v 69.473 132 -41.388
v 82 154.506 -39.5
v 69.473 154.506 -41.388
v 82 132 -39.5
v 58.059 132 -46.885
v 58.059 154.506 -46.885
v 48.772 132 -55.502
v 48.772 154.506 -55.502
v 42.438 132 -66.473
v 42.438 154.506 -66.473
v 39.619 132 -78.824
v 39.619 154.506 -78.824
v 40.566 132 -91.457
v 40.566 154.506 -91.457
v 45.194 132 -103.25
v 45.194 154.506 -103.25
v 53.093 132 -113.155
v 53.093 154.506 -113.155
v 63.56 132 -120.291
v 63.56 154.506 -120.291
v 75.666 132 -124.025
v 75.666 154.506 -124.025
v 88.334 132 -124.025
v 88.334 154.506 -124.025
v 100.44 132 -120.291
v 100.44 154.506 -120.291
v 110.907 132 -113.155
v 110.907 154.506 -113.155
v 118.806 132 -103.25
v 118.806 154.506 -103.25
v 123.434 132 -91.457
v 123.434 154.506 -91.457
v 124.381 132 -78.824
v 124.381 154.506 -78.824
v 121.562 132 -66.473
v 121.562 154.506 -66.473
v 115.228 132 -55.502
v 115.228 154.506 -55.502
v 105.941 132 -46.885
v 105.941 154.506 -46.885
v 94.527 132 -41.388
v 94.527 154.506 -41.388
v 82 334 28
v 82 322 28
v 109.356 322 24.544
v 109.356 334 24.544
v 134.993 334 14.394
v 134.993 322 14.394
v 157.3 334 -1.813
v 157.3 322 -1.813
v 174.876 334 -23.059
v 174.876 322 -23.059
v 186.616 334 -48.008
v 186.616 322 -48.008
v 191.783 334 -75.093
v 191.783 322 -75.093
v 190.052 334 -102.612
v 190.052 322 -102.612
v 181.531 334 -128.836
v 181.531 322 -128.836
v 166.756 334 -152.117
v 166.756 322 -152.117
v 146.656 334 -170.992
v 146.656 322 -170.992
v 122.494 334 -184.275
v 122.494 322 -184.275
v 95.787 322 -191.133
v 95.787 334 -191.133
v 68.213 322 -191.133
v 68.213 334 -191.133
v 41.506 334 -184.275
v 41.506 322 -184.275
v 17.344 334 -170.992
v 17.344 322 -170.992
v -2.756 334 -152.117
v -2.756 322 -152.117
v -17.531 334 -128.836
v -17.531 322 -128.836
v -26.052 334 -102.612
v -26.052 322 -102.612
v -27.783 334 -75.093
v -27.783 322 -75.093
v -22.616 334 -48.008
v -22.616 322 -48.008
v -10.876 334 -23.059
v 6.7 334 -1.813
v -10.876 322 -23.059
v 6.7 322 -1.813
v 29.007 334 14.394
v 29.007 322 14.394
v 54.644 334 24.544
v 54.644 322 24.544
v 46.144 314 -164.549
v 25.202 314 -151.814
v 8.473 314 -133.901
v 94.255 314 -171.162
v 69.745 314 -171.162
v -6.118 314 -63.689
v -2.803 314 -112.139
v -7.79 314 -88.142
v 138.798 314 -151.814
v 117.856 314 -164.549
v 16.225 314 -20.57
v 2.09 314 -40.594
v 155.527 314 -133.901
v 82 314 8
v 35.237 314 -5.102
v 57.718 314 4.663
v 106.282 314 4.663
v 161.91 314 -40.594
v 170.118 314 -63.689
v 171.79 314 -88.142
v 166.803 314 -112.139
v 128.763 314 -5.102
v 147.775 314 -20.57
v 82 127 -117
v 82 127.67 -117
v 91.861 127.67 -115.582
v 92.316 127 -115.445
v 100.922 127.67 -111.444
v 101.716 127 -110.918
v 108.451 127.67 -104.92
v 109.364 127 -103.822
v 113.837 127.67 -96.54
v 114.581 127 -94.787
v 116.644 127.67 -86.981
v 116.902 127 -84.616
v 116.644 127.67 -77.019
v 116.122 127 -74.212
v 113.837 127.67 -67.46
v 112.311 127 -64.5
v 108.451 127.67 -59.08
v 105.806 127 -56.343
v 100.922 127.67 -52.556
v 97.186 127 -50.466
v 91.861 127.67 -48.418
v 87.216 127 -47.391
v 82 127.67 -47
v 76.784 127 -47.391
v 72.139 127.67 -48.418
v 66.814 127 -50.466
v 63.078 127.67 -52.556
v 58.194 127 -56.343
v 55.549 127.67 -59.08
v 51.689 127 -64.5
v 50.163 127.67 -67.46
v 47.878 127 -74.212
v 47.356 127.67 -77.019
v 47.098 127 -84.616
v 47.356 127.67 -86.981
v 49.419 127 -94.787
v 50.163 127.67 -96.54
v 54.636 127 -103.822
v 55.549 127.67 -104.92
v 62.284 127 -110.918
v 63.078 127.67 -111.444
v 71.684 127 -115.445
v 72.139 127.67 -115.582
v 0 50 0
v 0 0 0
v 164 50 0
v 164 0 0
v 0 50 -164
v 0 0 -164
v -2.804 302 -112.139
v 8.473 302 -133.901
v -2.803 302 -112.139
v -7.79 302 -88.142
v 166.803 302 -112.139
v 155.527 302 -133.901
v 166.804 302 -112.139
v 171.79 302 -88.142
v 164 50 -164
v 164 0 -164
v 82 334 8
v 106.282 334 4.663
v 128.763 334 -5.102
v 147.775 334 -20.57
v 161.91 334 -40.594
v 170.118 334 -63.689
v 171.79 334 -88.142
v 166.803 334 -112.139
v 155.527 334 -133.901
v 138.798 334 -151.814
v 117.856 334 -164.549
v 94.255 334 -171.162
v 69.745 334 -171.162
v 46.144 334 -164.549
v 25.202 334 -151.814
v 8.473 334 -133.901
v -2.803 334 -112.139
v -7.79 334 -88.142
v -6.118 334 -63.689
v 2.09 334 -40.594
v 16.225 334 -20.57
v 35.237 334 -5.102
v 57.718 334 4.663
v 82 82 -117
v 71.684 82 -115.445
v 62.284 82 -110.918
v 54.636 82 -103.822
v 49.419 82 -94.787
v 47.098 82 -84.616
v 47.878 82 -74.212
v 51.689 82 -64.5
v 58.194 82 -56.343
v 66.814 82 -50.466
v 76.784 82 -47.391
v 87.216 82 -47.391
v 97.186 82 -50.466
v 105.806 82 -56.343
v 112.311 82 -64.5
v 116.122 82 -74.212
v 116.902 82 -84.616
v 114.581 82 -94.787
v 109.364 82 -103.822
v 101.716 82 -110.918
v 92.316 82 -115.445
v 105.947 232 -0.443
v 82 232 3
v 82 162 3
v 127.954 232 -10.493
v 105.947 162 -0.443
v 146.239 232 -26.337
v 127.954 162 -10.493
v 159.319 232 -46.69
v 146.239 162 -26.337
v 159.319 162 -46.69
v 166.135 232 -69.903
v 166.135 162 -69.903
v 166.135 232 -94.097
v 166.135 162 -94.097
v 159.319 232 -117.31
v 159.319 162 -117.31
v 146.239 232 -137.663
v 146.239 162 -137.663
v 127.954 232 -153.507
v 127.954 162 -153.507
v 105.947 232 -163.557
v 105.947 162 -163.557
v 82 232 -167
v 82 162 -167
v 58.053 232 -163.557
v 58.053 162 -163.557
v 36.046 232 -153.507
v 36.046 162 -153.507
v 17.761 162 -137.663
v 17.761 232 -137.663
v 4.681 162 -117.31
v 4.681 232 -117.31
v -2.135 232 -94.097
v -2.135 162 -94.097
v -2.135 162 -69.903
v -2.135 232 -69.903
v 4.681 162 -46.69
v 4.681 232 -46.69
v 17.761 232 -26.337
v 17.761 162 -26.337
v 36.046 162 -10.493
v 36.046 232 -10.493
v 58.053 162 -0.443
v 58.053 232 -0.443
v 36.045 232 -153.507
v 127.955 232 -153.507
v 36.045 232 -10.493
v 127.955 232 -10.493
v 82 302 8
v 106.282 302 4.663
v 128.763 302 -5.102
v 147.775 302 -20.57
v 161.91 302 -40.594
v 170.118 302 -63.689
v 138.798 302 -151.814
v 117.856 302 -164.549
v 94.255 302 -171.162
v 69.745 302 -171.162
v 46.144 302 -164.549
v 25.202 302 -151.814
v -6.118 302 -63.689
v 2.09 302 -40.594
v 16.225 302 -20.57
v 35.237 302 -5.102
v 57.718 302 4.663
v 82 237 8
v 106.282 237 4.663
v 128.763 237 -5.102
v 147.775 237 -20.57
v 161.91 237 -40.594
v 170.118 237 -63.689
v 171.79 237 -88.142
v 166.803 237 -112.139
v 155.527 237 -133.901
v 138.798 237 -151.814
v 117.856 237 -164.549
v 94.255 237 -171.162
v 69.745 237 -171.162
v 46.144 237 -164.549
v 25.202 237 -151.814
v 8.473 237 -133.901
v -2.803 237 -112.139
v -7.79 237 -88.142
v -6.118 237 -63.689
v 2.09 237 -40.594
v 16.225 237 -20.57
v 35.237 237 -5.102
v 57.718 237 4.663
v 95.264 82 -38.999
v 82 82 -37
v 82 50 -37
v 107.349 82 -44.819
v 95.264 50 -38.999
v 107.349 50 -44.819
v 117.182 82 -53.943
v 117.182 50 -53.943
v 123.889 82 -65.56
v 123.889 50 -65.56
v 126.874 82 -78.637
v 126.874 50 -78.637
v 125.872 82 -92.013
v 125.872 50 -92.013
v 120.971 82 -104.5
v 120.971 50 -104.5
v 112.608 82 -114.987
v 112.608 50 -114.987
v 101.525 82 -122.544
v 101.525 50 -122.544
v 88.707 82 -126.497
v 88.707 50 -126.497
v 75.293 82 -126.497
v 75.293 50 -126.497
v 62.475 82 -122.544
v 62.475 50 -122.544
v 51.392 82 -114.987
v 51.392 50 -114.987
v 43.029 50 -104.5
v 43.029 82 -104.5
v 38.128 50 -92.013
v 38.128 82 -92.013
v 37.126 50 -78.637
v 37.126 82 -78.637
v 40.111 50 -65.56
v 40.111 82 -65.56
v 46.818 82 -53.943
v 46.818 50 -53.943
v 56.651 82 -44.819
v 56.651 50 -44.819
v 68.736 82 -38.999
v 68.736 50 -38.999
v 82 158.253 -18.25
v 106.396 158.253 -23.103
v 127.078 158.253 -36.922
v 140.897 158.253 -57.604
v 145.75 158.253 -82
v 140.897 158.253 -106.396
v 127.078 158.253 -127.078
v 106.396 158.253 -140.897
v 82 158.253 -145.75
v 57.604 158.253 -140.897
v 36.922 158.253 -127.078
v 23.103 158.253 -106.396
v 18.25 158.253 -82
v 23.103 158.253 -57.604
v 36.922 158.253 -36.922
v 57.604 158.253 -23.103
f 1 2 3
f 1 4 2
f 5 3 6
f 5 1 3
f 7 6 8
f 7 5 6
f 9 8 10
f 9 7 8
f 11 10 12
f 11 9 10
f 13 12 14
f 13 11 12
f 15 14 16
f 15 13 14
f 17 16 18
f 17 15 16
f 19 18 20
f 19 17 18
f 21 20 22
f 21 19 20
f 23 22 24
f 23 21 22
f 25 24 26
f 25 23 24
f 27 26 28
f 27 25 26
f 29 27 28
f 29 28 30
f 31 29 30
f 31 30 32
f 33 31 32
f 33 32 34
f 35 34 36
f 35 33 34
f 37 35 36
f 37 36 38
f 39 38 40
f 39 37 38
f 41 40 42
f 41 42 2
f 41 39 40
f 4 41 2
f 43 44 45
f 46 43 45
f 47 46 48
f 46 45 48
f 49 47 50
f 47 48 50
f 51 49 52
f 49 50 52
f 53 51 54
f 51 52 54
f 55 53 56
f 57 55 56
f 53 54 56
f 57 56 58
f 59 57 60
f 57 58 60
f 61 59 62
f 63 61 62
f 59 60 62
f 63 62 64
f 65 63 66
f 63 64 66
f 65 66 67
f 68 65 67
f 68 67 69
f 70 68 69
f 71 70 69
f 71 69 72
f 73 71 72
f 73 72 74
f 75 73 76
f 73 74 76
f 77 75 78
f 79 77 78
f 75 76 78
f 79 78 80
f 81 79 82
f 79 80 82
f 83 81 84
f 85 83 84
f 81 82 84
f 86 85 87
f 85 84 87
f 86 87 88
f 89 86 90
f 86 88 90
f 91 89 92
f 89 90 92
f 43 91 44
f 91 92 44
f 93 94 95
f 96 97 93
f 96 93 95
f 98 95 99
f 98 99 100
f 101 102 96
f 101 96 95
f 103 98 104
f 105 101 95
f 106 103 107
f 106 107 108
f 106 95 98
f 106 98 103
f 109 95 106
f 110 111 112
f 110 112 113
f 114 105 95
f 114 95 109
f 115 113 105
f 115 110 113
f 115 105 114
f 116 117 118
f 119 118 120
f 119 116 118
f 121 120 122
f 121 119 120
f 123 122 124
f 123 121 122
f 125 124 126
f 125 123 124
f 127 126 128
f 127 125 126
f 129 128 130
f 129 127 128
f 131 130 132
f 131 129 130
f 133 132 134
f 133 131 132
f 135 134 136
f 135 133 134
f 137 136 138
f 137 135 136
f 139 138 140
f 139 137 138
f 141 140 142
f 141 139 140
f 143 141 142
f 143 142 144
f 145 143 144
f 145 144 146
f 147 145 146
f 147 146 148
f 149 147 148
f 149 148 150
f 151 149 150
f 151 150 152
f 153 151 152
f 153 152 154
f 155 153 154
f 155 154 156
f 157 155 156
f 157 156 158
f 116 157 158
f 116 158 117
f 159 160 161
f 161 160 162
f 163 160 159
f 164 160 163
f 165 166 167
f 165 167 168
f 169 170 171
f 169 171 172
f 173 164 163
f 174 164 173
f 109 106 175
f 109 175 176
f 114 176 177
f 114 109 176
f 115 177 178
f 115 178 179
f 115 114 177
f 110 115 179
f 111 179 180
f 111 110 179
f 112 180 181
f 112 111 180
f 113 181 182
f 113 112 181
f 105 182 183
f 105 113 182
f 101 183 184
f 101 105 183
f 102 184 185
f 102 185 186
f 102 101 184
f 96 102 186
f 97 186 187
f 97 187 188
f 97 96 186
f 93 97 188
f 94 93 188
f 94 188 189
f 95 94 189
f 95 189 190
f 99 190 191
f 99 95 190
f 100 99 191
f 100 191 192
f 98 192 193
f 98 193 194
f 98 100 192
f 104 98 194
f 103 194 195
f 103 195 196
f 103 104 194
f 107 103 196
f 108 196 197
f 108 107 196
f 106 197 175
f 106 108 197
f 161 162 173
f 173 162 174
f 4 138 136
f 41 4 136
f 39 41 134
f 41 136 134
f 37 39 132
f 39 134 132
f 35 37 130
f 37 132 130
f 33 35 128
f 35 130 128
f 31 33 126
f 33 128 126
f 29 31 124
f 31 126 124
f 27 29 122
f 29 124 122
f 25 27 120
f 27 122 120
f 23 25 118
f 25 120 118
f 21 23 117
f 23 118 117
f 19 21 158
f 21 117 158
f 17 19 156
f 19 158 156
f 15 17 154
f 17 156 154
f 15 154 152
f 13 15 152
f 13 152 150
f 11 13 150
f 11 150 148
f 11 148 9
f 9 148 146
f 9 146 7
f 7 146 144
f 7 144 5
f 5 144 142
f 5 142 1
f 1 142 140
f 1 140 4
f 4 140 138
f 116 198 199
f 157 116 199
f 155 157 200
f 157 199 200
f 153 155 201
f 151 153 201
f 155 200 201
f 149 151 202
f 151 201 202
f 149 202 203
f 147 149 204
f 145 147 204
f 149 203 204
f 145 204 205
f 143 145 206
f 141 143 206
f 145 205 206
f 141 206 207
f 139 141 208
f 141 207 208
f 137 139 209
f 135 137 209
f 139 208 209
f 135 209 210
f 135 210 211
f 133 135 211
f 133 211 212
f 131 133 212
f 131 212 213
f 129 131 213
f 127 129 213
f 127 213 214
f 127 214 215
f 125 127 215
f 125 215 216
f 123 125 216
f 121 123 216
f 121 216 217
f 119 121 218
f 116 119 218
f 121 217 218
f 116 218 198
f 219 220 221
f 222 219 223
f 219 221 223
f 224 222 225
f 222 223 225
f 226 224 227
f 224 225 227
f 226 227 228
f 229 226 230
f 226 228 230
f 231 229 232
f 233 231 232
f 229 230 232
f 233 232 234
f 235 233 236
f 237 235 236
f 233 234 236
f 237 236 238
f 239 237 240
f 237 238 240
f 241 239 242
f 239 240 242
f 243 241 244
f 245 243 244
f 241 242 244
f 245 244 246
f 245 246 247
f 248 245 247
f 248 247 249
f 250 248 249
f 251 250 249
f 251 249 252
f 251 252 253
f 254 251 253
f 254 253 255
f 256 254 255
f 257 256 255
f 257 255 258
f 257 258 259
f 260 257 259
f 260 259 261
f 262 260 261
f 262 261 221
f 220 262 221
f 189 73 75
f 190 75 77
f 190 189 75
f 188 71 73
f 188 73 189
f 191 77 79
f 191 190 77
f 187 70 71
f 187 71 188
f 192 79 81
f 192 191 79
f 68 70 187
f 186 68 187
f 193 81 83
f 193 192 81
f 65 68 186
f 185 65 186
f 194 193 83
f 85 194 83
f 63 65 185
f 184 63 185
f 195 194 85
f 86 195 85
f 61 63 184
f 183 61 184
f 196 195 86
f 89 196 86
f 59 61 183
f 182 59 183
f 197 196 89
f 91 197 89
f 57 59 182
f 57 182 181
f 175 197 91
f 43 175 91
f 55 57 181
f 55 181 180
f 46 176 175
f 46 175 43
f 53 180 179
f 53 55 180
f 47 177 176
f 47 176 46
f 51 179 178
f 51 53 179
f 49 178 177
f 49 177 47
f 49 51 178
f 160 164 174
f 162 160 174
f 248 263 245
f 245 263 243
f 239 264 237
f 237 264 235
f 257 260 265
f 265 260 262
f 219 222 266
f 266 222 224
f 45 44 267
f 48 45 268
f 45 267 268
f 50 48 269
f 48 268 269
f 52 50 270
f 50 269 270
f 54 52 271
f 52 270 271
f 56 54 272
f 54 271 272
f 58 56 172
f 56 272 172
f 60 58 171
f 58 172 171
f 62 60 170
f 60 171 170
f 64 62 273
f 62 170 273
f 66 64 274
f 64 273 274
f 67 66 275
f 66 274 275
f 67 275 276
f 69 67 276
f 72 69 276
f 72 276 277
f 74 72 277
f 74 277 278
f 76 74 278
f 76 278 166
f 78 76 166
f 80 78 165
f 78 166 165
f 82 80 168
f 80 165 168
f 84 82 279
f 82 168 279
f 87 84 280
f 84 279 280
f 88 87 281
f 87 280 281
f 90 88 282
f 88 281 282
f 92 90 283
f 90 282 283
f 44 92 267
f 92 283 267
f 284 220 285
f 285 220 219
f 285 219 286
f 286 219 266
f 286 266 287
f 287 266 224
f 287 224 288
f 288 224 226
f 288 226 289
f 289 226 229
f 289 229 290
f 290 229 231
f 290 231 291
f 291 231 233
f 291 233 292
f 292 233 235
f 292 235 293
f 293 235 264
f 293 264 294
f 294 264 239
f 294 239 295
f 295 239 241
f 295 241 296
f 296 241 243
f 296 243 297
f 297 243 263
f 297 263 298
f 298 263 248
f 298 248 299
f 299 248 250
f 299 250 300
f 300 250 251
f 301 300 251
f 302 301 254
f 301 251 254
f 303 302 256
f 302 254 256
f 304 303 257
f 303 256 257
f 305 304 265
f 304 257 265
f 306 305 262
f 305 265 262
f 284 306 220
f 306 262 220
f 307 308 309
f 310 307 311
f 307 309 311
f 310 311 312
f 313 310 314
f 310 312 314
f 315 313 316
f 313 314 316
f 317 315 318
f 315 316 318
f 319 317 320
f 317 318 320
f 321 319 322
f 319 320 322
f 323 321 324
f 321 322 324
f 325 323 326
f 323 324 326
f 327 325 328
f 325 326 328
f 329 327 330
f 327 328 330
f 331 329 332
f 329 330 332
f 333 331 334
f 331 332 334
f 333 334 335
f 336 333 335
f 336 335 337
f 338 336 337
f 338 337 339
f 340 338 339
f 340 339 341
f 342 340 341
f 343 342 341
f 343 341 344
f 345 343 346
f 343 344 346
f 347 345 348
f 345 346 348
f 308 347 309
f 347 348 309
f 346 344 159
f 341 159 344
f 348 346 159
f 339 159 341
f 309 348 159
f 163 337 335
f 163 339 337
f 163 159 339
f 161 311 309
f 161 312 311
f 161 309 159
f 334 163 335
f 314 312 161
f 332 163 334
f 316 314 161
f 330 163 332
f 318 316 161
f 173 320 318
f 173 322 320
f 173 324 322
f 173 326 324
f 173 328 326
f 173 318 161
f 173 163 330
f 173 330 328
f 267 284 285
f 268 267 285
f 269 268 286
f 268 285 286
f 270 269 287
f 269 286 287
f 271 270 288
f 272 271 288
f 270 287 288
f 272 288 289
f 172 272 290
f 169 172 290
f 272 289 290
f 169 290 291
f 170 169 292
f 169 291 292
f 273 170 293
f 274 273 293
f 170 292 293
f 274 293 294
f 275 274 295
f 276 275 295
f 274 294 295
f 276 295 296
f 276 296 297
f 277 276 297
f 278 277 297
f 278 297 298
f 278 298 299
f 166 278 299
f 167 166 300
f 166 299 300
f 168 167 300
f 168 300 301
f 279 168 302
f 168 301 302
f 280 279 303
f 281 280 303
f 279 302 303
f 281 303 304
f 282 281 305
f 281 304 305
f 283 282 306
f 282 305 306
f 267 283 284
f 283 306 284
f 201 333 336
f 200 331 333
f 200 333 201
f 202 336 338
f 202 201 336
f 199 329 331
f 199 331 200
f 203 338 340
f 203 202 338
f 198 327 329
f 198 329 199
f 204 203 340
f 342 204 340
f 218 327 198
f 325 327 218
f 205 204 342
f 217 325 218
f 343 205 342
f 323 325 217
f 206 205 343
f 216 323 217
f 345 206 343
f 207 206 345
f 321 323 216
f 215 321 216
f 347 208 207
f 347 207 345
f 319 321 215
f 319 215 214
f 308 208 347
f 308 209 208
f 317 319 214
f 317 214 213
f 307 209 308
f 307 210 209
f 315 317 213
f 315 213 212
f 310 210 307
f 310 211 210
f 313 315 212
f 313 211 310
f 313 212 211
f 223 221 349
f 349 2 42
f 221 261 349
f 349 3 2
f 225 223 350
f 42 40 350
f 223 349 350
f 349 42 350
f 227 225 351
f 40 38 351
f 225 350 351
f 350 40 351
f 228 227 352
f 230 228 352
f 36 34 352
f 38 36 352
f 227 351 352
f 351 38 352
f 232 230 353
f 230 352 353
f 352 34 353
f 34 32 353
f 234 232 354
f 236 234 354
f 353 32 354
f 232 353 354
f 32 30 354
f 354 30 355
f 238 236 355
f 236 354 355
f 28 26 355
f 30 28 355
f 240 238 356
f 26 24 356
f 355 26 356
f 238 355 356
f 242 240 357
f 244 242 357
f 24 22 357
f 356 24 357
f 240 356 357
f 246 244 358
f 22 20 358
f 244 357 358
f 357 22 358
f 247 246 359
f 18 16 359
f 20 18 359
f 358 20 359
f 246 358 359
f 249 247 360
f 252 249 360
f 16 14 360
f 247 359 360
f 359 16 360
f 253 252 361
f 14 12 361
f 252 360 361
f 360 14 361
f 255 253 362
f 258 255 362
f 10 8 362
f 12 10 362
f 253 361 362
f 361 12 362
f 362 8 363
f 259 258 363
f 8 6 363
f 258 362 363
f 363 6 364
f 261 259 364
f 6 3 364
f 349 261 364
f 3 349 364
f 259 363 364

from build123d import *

# Parameters (mm, degrees)
SKETCH1_W           = 164
SKETCH1_H           = 164
BOSS_EXTRUDE1_DEPTH = 50
SKETCH2_R           = 45
BOSS_EXTRUDE2_DEPTH = 32
SKETCH3_R           = 35
BOSS_EXTRUDE3_DEPTH = 45
SKETCH4_R           = 42.5
BOSS_EXTRUDE4_DEPTH = 25
SKETCH5_R           = 85
BOSS_EXTRUDE5_DEPTH = 80
SKETCH6_R           = 90
BOSS_EXTRUDE6_DEPTH = 70
SKETCH7_R           = 110
BOSS_EXTRUDE7_DEPTH = 32
CHAMFER1_SIZE       = 20
CHAMFER2_SIZE       = 5
CHAMFER3_SIZE       = 10
CHAMFER3_SIZE_2     = 56.712818196
CHAMFER4_SIZE       = 5
CHAMFER4_SIZE_2     = 8.660254038
CUT_EXTRUDE1_START  = -20
SKETCH8_R           = 90
CUT_EXTRUDE1_DEPTH  = 20


# Some blends are built 0.0001 mm under size
with BuildPart() as part:
    # Sketch1 → Boss-Extrude1 (new body)
    with BuildSketch(Plane(origin=(0, 0, 0), x_dir=(1, 0, 0), z_dir=(0, 1, 0))):
        with Locations((82, 82)):
            Rectangle(SKETCH1_W, SKETCH1_H)
    extrude(amount=BOSS_EXTRUDE1_DEPTH)

    # Sketch2 → Boss-Extrude2 (add)
    with BuildSketch(Plane(origin=(0, 50, 0), x_dir=(1, 0, 0), z_dir=(0, 1, 0))):
        with Locations(Location((82, 82, 0), (0, 0, 270))):
            Circle(SKETCH2_R)
    extrude(amount=BOSS_EXTRUDE2_DEPTH)

    # Sketch3 → Boss-Extrude3 (add)
    with BuildSketch(Plane(origin=(0, 82, 0), x_dir=(1, 0, 0), z_dir=(0, 1, 0))):
        with Locations(Location((82, 82, 0), (0, 0, 90))):
            Circle(SKETCH3_R)
    extrude(amount=BOSS_EXTRUDE3_DEPTH)

    # Sketch4 → Boss-Extrude4 (add)
    with BuildSketch(Plane(origin=(0, 127, 0), x_dir=(1, 0, 0), z_dir=(0, 1, 0))):
        with Locations(Location((82, 82, 0), (0, 0, 270))):
            Circle(SKETCH4_R)
    extrude(amount=BOSS_EXTRUDE4_DEPTH)

    # Sketch5 → Boss-Extrude5 (add)
    with BuildSketch(Plane(origin=(0, 152, 0), x_dir=(1, 0, 0), z_dir=(0, 1, 0))):
        with Locations(Location((82, 82, 0), (0, 0, 270))):
            Circle(SKETCH5_R)
    extrude(amount=BOSS_EXTRUDE5_DEPTH)

    # Sketch6 → Boss-Extrude6 (add)
    with BuildSketch(Plane(origin=(0, 232, 0), x_dir=(1, 0, 0), z_dir=(0, 1, 0))):
        with Locations(Location((82, 82, 0), (0, 0, 270))):
            Circle(SKETCH6_R)
    extrude(amount=BOSS_EXTRUDE6_DEPTH)

    # Sketch7 → Boss-Extrude7 (add)
    with BuildSketch(Plane(origin=(0, 302, 0), x_dir=(1, 0, 0), z_dir=(0, 1, 0))):
        with Locations(Location((82, 82, 0), (0, 0, 270))):
            Circle(SKETCH7_R)
    extrude(amount=BOSS_EXTRUDE7_DEPTH)

    # Chamfer1
    chamfer1_edges = [part.edges().sort_by_distance(p)[0] for p in [
        (82, 302, -192),
    ]]
    chamfer(chamfer1_edges, length=CHAMFER1_SIZE - 0.0001)  # a hair under: the kernel refuses the full size

    # Chamfer2
    chamfer2_edges = [part.edges().sort_by_distance(p)[0] for p in [
        (82, 232, -172),
    ]]
    chamfer(chamfer2_edges, length=CHAMFER2_SIZE - 0.0001)  # a hair under: the kernel refuses the full size

    # Chamfer3
    # the kernel refuses this chamfer: 56.712818196, 10 mm, written as the material it takes off along each edge
    with BuildSketch(Plane(origin=(82, 152, -82), x_dir=(0, 0, 1), z_dir=(-1, 0, 0))) as chamfer3_piece_1_section:
        Polygon((85, CHAMFER3_SIZE), (85 - CHAMFER3_SIZE_2, 0), (85, 0), align=None)
    chamfer3_piece_1 = revolve(axis=Axis((82, 152, -82), (0, 1, 0)), mode=Mode.PRIVATE)
    chamfer3_piece_1 = chamfer3_piece_1 - Plane(origin=(82, 157.937254532, -82), x_dir=(0, 0, 1), z_dir=(0, -1, 0)) * Cylinder(42.5, 340, mode=Mode.PRIVATE)
    add(chamfer3_piece_1, mode=Mode.SUBTRACT)

    # Chamfer4
    # the kernel refuses this chamfer: 8.660254038, 5 mm, written as the material it takes off along each edge
    with BuildSketch(Plane(origin=(82, 127, -82), x_dir=(0, 0, 1), z_dir=(-1, 0, 0))) as chamfer4_piece_1_section:
        Polygon((42.5, CHAMFER4_SIZE), (42.5 - CHAMFER4_SIZE_2, 0), (42.5, 0), align=None)
    chamfer4_piece_1 = revolve(axis=Axis((82, 127, -82), (0, 1, 0)), mode=Mode.PRIVATE)
    chamfer4_piece_1 = chamfer4_piece_1 - Plane(origin=(82, 129.764704239, -82), x_dir=(0, 0, -1), z_dir=(0, -1, 0)) * Cylinder(35, 170, mode=Mode.PRIVATE)
    add(chamfer4_piece_1, mode=Mode.SUBTRACT)

    # Sketch8 → Cut-Extrude1 (cut)
    with BuildSketch(Plane(origin=(0, 334, 0), x_dir=(1, 0, 0), z_dir=(0, 1, 0)).offset(CUT_EXTRUDE1_START)):
        with Locations(Location((82, 82, 0), (0, 0, 270))):
            Circle(SKETCH8_R)
    extrude(amount=CUT_EXTRUDE1_DEPTH, mode=Mode.SUBTRACT)


solid = part.part
